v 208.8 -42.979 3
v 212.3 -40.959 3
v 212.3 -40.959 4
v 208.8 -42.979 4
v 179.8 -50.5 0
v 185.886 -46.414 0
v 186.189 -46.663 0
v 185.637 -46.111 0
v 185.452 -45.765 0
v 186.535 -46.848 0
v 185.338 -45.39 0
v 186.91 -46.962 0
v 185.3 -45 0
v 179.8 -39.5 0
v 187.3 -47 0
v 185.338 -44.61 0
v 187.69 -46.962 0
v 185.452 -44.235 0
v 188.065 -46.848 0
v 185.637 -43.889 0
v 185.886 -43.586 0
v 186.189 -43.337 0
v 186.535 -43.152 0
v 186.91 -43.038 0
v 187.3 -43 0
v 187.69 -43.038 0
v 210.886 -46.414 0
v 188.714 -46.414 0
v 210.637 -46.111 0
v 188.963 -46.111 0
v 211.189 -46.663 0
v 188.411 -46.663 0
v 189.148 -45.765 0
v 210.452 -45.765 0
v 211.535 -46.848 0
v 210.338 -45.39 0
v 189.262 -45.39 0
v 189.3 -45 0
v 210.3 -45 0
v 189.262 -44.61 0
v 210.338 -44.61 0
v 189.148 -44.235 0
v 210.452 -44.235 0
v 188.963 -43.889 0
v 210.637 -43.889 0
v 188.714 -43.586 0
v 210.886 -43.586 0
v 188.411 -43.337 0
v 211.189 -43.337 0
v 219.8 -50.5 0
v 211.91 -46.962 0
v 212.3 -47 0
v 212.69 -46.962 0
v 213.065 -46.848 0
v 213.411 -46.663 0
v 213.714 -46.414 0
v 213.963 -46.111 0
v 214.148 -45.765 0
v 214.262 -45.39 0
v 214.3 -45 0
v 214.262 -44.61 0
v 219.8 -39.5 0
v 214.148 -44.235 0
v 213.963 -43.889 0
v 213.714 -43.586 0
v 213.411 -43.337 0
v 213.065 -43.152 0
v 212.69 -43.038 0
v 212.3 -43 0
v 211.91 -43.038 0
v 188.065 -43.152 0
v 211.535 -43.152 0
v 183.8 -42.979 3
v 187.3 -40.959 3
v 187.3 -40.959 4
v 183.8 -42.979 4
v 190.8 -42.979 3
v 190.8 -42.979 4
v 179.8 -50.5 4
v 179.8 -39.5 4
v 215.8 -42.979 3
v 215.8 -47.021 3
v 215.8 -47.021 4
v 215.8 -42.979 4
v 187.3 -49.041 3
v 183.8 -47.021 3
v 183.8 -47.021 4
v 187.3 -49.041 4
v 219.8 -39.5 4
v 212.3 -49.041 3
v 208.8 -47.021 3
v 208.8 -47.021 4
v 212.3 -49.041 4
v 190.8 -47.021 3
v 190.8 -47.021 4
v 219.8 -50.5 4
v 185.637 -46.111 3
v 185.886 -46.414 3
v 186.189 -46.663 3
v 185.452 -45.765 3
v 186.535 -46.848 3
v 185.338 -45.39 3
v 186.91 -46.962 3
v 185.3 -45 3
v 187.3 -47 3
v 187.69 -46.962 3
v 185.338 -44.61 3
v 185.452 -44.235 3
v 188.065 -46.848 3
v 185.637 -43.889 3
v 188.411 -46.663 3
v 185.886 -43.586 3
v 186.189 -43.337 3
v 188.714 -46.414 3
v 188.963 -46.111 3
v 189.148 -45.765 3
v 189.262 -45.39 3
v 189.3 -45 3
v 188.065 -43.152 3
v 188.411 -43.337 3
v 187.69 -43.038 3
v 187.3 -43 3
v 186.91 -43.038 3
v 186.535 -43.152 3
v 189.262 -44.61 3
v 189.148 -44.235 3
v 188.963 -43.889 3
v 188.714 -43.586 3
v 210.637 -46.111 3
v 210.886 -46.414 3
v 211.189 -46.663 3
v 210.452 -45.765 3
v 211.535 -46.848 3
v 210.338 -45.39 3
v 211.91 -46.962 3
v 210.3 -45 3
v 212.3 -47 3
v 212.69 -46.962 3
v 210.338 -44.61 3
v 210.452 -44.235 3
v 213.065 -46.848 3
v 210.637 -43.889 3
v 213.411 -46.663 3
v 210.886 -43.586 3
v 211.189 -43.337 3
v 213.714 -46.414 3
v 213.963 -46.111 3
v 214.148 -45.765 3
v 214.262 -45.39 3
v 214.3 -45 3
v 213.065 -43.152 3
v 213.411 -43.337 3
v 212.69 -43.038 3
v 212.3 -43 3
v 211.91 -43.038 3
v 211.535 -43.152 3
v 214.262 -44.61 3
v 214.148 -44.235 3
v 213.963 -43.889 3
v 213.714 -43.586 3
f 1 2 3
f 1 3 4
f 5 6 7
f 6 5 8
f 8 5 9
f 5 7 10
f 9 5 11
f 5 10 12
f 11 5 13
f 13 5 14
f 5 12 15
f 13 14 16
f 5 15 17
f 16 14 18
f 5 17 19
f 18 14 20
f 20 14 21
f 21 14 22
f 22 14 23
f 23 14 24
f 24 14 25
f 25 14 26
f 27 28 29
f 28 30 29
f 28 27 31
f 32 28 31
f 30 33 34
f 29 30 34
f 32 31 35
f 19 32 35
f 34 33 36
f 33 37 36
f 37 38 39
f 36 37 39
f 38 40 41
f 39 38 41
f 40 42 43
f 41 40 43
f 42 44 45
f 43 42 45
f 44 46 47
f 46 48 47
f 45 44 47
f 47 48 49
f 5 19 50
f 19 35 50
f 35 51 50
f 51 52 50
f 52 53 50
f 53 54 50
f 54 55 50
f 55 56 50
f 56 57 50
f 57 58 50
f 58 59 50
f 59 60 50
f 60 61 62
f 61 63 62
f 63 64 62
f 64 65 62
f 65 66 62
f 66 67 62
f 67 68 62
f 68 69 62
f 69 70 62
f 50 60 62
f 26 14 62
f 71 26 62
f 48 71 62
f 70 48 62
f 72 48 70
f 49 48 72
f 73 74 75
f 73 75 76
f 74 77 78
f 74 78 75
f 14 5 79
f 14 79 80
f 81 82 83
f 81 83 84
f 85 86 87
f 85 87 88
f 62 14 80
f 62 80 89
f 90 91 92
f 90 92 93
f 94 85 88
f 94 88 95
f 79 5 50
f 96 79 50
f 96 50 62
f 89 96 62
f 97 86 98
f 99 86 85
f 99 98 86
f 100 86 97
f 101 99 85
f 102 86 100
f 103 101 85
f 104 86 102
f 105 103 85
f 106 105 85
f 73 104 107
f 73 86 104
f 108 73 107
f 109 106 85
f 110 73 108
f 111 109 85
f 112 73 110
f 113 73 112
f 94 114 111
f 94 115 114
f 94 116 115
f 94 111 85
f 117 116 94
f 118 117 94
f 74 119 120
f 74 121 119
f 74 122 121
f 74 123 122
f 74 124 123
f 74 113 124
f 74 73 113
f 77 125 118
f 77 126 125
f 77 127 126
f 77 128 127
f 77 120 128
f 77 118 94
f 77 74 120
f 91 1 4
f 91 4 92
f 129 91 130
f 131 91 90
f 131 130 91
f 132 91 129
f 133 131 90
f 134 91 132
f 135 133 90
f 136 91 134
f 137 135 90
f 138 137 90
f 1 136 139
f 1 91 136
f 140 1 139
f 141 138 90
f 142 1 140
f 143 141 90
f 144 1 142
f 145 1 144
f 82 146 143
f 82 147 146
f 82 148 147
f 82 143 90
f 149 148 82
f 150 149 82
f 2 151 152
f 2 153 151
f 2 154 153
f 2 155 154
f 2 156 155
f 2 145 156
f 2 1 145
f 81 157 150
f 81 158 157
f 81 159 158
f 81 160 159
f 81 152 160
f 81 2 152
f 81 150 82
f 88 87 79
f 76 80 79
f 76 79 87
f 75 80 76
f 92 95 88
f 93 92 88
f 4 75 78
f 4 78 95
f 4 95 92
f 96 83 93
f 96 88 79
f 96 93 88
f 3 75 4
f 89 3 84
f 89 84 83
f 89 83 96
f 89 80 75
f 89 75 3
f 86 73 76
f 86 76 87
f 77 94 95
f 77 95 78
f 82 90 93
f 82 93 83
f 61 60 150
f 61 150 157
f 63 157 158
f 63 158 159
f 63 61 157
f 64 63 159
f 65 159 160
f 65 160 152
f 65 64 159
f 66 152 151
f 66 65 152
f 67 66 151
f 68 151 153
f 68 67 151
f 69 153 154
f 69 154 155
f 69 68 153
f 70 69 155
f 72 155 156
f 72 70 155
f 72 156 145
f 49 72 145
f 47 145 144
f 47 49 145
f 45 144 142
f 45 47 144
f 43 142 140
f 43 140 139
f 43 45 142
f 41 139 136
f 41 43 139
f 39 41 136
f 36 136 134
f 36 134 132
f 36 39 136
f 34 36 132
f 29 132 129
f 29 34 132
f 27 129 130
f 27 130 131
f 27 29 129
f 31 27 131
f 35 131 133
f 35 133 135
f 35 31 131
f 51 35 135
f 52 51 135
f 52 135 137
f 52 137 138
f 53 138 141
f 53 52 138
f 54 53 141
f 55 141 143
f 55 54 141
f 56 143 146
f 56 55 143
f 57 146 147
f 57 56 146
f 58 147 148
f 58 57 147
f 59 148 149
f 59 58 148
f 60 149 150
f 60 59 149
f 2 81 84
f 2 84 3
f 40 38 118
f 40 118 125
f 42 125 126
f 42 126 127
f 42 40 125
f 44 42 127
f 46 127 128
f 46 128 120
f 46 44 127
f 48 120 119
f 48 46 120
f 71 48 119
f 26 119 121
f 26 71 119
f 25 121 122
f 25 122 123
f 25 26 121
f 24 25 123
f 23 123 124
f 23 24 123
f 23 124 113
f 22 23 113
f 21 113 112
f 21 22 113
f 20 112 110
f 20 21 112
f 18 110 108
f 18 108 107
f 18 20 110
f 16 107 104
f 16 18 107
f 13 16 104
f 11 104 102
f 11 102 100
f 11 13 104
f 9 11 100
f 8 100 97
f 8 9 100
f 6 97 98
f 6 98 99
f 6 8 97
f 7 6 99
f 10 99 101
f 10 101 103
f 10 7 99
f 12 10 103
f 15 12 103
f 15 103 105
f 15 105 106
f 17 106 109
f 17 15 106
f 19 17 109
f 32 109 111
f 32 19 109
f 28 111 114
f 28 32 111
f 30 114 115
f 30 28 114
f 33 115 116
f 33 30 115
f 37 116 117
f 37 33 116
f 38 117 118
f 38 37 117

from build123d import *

# Parameters (mm, degrees)
SKETCH1_W           = 40
SKETCH1_H           = 11
SKETCH1_R           = 2
BOSS_EXTRUDE1_DEPTH = 3
SKETCH1_3_W         = 40
SKETCH1_3_H         = 11
BOSS_EXTRUDE2_DEPTH = 4


with BuildPart() as part:
    # Sketch1 → Boss-Extrude1 (new body)
    with BuildSketch(Plane.XY):
        with Locations((199.8, -45)):
            Rectangle(SKETCH1_W, SKETCH1_H)
        with Locations((187.3, -45)):
            Circle(SKETCH1_R, mode=Mode.SUBTRACT)
        with Locations((212.3, -45)):
            Circle(SKETCH1_R, mode=Mode.SUBTRACT)
    extrude(amount=BOSS_EXTRUDE1_DEPTH)

    # Sketch1<3> → Boss-Extrude2 (add)
    with BuildSketch(Plane.XY):
        with Locations((199.8, -45)):
            Rectangle(SKETCH1_3_W, SKETCH1_3_H)
        Polygon((190.8, -47.020725942), (187.3, -49.041451884), (183.8, -47.020725942), (183.8, -42.979274058), (187.3, -40.958548116), (190.8, -42.979274058), align=None, mode=Mode.SUBTRACT)
        Polygon((215.8, -47.020725942), (212.3, -49.041451884), (208.8, -47.020725942), (208.8, -42.979274058), (212.3, -40.958548116), (215.8, -42.979274058), align=None, mode=Mode.SUBTRACT)
    extrude(amount=BOSS_EXTRUDE2_DEPTH)


solid = part.part
